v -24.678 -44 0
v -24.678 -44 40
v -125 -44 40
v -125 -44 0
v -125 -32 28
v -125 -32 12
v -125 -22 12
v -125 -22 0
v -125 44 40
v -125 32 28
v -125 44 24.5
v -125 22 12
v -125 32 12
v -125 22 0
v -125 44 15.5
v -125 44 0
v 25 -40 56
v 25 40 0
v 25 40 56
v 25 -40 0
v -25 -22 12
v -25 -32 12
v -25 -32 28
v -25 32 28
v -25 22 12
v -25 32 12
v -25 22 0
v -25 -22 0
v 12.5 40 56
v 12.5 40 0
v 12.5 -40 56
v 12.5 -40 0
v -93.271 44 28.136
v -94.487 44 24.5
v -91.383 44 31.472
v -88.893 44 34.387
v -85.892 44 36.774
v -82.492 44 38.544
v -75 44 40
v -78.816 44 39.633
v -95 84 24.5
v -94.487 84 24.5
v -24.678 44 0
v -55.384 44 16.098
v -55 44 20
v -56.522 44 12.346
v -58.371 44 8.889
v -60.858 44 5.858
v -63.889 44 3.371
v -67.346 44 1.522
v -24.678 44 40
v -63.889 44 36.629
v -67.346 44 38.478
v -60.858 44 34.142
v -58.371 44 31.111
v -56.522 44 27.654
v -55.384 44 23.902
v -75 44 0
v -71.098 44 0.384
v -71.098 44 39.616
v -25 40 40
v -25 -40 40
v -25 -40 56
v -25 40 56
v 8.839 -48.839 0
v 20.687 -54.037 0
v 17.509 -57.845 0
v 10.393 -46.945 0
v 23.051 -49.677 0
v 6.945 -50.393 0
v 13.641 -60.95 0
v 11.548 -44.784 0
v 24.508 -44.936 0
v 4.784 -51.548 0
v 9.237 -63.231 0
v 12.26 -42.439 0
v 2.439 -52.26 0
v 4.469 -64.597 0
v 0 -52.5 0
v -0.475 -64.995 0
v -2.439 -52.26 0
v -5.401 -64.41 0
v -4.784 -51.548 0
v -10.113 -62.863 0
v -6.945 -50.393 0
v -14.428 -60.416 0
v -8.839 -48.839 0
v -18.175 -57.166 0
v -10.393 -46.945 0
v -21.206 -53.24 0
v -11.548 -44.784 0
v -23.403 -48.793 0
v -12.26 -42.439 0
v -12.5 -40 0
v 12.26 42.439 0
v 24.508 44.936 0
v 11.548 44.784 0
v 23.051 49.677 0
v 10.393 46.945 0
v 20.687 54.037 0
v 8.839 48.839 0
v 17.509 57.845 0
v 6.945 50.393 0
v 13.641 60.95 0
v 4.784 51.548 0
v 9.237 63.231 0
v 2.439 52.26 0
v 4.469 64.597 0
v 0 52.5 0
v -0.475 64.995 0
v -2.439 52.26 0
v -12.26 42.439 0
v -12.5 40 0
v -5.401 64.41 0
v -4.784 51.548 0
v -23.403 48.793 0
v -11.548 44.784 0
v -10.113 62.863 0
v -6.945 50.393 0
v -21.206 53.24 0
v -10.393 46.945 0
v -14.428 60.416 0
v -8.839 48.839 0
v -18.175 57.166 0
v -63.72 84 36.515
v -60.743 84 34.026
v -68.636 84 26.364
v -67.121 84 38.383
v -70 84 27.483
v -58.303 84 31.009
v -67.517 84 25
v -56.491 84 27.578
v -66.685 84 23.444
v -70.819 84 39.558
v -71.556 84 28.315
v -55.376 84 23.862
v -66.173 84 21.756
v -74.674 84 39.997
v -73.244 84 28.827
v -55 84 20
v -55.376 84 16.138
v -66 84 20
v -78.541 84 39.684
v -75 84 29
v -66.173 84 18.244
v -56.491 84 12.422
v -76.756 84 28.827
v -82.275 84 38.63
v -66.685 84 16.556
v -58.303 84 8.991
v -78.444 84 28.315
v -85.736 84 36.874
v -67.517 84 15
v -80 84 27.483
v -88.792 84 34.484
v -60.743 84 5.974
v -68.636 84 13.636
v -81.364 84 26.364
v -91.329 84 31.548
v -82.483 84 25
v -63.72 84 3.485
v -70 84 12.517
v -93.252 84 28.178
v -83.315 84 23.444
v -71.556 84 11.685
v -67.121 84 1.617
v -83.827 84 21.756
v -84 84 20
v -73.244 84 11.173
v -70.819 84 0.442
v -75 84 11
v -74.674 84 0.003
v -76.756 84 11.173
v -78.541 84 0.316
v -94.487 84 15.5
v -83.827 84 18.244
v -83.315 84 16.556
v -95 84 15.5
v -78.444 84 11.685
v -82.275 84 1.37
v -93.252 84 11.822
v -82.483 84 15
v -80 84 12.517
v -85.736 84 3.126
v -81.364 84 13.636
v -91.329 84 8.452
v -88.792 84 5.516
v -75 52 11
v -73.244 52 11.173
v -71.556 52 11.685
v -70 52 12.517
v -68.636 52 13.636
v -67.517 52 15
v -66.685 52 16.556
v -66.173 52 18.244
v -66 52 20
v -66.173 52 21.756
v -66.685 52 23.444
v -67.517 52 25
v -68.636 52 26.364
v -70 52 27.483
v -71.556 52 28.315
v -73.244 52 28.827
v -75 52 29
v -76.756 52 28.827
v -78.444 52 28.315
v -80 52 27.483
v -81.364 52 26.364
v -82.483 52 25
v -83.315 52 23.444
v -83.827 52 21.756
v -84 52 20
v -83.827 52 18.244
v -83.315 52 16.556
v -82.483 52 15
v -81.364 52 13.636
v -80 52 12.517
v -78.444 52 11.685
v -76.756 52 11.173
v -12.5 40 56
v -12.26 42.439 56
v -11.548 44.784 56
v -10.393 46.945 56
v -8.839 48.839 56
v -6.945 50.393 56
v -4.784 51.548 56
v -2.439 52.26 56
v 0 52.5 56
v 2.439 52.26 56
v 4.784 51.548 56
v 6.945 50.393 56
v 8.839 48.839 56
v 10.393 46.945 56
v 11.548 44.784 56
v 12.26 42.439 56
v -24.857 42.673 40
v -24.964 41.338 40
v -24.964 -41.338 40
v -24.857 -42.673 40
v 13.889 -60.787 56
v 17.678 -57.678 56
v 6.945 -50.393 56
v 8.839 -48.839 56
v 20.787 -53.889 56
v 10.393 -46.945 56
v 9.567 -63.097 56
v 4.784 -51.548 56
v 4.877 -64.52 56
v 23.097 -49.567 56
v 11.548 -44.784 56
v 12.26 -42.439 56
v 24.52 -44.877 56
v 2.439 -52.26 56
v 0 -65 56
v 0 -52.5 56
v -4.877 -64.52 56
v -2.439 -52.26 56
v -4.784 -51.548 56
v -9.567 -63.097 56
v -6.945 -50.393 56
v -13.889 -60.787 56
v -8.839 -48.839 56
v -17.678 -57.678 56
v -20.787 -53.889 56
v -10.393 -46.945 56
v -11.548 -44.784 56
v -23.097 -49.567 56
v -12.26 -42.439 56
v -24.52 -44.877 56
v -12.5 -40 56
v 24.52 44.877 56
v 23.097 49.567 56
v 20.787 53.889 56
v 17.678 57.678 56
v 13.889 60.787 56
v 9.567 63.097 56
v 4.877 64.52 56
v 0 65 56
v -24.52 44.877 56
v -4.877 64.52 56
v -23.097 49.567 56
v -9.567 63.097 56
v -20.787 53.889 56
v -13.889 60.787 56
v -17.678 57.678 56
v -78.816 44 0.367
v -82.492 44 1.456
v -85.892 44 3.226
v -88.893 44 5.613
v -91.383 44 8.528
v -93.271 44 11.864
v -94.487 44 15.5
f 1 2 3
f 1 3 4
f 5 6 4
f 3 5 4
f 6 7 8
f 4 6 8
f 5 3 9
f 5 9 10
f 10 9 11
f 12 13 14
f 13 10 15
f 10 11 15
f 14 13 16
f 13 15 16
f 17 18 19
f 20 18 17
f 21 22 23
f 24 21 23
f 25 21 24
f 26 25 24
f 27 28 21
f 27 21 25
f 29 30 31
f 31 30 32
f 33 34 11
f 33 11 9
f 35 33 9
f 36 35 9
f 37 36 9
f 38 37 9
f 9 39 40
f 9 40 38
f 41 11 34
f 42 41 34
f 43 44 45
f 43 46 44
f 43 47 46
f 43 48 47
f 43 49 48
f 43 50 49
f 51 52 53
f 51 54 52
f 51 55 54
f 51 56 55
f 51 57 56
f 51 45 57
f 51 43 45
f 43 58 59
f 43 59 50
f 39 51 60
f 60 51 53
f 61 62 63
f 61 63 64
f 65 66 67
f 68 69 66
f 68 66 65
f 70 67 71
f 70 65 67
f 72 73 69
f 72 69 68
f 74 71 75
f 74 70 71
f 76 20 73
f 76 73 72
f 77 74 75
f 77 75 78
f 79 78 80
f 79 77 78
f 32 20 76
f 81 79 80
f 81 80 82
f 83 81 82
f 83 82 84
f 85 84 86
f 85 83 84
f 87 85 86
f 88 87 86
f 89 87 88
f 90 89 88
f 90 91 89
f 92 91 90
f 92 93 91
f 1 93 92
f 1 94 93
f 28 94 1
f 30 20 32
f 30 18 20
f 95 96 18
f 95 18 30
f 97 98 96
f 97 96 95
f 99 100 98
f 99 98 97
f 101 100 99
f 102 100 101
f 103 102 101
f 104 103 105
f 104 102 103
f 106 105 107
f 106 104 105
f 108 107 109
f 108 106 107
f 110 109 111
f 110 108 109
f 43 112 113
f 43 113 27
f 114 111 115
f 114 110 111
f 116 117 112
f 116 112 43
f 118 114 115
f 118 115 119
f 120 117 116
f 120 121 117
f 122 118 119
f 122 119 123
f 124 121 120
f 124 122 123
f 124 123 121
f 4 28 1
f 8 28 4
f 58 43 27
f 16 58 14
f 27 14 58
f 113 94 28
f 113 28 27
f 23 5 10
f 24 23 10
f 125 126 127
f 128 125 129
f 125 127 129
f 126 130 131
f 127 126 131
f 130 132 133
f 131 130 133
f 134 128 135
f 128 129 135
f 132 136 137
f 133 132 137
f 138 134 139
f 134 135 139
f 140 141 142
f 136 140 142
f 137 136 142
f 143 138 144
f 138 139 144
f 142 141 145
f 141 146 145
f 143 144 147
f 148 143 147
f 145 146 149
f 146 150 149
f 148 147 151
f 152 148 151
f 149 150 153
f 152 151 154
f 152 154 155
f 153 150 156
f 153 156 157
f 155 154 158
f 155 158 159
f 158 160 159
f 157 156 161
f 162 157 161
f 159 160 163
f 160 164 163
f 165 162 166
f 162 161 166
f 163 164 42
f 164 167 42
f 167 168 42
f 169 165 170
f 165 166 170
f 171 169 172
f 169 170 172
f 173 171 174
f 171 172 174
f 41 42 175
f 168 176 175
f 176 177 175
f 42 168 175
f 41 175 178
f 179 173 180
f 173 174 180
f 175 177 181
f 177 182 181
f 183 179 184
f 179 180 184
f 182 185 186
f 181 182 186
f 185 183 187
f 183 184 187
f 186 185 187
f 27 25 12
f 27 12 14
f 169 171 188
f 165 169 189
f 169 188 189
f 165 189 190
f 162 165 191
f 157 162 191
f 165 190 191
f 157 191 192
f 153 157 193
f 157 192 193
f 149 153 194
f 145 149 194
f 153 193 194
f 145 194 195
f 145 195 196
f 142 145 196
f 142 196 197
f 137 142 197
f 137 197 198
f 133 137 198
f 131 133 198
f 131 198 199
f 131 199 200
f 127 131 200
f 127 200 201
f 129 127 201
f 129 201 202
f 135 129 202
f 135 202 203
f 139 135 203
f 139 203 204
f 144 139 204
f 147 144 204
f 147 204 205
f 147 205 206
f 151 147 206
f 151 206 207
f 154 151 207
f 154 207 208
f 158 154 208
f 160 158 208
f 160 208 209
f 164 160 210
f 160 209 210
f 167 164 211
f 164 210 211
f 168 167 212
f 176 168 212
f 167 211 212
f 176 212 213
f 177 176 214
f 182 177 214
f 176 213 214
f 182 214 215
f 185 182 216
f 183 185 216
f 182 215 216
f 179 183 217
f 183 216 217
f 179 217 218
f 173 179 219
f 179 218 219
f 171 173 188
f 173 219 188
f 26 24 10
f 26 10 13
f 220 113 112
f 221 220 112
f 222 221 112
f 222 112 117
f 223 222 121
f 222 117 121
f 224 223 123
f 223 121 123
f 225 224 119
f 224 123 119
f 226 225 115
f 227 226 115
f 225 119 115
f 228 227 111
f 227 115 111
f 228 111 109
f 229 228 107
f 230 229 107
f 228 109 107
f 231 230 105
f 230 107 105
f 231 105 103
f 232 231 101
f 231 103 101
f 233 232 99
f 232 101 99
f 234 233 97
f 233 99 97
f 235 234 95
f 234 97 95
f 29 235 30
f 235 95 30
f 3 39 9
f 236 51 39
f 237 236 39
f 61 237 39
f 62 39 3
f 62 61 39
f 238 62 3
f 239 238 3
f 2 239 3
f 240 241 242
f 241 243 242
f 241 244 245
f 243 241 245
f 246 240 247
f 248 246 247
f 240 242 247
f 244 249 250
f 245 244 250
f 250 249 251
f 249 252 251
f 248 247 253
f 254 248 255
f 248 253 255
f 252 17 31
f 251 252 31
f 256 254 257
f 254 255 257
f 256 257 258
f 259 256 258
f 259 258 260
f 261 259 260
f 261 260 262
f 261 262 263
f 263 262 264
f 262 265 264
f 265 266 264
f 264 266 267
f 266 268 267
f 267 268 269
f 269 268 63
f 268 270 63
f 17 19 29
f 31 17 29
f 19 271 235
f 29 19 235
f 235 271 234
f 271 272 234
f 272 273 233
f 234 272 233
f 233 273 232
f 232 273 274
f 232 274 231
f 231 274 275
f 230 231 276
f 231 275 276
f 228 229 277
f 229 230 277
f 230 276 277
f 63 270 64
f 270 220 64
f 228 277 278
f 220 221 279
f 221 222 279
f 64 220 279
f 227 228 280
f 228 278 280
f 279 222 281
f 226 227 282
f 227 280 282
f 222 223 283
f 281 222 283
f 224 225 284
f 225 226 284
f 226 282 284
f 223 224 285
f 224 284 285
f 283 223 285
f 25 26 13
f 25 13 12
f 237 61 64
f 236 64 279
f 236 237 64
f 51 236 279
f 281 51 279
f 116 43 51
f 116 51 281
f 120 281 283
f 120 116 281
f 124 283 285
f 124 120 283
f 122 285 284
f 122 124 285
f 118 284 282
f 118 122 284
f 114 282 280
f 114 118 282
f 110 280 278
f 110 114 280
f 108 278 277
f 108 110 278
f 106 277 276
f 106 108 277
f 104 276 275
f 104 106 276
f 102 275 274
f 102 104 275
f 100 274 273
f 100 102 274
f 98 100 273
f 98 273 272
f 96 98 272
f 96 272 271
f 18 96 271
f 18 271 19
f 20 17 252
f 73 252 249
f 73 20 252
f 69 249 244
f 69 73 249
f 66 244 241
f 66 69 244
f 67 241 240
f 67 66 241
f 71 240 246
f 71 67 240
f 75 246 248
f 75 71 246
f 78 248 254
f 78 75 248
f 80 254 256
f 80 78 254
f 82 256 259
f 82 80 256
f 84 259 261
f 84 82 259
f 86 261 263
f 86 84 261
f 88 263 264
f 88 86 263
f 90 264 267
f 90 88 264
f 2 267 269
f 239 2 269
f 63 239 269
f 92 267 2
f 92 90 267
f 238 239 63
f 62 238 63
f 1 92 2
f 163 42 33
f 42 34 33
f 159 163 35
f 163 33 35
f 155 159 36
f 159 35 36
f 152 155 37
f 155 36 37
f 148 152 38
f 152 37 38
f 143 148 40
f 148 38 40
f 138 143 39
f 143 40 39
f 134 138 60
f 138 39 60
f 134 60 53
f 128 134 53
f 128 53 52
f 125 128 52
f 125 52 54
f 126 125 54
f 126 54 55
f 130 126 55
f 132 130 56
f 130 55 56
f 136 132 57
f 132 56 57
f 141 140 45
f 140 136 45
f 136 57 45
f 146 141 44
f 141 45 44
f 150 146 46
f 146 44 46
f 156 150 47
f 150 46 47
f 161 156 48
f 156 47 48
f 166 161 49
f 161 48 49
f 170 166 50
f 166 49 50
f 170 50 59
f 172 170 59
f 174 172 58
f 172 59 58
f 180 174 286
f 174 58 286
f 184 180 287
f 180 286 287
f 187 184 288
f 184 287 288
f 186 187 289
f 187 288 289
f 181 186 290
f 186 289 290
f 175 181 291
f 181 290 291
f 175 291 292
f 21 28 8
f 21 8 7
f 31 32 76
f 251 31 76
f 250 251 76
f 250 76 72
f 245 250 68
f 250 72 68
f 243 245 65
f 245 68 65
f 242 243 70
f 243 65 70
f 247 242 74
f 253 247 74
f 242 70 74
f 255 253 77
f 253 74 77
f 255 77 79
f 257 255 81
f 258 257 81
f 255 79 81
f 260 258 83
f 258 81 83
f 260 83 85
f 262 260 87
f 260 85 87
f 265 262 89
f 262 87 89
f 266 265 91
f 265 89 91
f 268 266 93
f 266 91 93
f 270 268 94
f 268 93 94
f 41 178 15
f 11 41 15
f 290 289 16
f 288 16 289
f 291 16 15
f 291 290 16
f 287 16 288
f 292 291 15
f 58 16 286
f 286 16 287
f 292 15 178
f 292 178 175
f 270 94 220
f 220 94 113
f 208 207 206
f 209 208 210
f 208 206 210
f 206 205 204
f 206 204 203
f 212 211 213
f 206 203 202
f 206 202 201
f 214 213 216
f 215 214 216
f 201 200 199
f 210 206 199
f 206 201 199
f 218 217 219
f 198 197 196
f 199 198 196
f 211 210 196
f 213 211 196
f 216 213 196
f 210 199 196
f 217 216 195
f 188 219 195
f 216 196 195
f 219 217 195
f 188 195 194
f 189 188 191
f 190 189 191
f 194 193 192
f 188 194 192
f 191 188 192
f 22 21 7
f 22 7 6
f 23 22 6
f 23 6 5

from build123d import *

# Parameters (mm, degrees)
BOSS_EXTRUDE1_DEPTH        = 56
BOSS_EXTRUDE2_START        = -0.322075
BOSS_EXTRUDE2_DEPTH        = 100.322075
SKETCH5_R                  = 20
BOSS_EXTRUDE3_DEPTH        = 40
RIB7_START                 = -4.5
RIB7_DEPTH                 = 9
F_12_0MM_DOWEL_HOLE1_D     = 18
F_12_0MM_DOWEL_HOLE1_DEPTH = 32


with BuildPart() as part:
    # Sketch3 → Boss-Extrude1 (new body)
    with BuildSketch(Plane.XY):
        with BuildLine():
            Line((25, 40), (25, -40))
            ThreePointArc((25, -40), (0, -65), (-25, -40))
            Line((-25, -40), (-25, 40))
            ThreePointArc((-25, 40), (0, 65), (25, 40))
        make_face()
        with BuildLine():
            Line((12.5, 40), (12.5, -40))
            ThreePointArc((12.5, -40), (0, -52.5), (-12.5, -40))
            Line((-12.5, -40), (-12.5, 40))
            ThreePointArc((-12.5, 40), (0, 52.5), (12.5, 40))
        make_face(mode=Mode.SUBTRACT)
    extrude(amount=BOSS_EXTRUDE1_DEPTH)

    # Sketch4 → Boss-Extrude2 (add)
    with BuildSketch(Plane.ZY.offset(25).offset(BOSS_EXTRUDE2_START)):
        Polygon((12, 22), (0, 22), (0, 44), (40, 44), (40, -44), (0, -44), (0, -22), (12, -22), (12, -32), (28, -32), (28, 32), (12, 32), align=None)
    extrude(amount=BOSS_EXTRUDE2_DEPTH)

    # Sketch5 → Boss-Extrude3 (add)
    with BuildSketch(Plane(origin=(0, 44, 0), x_dir=(1, 0, 0), z_dir=(0, 1, 0))):
        with Locations(Location((-75, -20, 0), (0, 0, 270))):
            Circle(SKETCH5_R)
    extrude(amount=BOSS_EXTRUDE3_DEPTH)

    # Rib7: read off the stored shape, not the designer's step
    # Rib7 outline → Rib7 (add)
    with BuildSketch(Plane.XY.offset(20).offset(RIB7_START)):
        Polygon((-125, 44), (-94.48717527, 44), (-94.48717527, 84), (-95, 84), align=None)
    extrude(amount=RIB7_DEPTH)

    # Ø12.0mm Dowel Hole1
    with Locations(Plane(origin=(-75, 84, 20), x_dir=(0, 0, 1), z_dir=(0, 1, 0))):
        with Locations((0, 0)):
            Hole(F_12_0MM_DOWEL_HOLE1_D / 2, depth=F_12_0MM_DOWEL_HOLE1_DEPTH)


solid = part.part
